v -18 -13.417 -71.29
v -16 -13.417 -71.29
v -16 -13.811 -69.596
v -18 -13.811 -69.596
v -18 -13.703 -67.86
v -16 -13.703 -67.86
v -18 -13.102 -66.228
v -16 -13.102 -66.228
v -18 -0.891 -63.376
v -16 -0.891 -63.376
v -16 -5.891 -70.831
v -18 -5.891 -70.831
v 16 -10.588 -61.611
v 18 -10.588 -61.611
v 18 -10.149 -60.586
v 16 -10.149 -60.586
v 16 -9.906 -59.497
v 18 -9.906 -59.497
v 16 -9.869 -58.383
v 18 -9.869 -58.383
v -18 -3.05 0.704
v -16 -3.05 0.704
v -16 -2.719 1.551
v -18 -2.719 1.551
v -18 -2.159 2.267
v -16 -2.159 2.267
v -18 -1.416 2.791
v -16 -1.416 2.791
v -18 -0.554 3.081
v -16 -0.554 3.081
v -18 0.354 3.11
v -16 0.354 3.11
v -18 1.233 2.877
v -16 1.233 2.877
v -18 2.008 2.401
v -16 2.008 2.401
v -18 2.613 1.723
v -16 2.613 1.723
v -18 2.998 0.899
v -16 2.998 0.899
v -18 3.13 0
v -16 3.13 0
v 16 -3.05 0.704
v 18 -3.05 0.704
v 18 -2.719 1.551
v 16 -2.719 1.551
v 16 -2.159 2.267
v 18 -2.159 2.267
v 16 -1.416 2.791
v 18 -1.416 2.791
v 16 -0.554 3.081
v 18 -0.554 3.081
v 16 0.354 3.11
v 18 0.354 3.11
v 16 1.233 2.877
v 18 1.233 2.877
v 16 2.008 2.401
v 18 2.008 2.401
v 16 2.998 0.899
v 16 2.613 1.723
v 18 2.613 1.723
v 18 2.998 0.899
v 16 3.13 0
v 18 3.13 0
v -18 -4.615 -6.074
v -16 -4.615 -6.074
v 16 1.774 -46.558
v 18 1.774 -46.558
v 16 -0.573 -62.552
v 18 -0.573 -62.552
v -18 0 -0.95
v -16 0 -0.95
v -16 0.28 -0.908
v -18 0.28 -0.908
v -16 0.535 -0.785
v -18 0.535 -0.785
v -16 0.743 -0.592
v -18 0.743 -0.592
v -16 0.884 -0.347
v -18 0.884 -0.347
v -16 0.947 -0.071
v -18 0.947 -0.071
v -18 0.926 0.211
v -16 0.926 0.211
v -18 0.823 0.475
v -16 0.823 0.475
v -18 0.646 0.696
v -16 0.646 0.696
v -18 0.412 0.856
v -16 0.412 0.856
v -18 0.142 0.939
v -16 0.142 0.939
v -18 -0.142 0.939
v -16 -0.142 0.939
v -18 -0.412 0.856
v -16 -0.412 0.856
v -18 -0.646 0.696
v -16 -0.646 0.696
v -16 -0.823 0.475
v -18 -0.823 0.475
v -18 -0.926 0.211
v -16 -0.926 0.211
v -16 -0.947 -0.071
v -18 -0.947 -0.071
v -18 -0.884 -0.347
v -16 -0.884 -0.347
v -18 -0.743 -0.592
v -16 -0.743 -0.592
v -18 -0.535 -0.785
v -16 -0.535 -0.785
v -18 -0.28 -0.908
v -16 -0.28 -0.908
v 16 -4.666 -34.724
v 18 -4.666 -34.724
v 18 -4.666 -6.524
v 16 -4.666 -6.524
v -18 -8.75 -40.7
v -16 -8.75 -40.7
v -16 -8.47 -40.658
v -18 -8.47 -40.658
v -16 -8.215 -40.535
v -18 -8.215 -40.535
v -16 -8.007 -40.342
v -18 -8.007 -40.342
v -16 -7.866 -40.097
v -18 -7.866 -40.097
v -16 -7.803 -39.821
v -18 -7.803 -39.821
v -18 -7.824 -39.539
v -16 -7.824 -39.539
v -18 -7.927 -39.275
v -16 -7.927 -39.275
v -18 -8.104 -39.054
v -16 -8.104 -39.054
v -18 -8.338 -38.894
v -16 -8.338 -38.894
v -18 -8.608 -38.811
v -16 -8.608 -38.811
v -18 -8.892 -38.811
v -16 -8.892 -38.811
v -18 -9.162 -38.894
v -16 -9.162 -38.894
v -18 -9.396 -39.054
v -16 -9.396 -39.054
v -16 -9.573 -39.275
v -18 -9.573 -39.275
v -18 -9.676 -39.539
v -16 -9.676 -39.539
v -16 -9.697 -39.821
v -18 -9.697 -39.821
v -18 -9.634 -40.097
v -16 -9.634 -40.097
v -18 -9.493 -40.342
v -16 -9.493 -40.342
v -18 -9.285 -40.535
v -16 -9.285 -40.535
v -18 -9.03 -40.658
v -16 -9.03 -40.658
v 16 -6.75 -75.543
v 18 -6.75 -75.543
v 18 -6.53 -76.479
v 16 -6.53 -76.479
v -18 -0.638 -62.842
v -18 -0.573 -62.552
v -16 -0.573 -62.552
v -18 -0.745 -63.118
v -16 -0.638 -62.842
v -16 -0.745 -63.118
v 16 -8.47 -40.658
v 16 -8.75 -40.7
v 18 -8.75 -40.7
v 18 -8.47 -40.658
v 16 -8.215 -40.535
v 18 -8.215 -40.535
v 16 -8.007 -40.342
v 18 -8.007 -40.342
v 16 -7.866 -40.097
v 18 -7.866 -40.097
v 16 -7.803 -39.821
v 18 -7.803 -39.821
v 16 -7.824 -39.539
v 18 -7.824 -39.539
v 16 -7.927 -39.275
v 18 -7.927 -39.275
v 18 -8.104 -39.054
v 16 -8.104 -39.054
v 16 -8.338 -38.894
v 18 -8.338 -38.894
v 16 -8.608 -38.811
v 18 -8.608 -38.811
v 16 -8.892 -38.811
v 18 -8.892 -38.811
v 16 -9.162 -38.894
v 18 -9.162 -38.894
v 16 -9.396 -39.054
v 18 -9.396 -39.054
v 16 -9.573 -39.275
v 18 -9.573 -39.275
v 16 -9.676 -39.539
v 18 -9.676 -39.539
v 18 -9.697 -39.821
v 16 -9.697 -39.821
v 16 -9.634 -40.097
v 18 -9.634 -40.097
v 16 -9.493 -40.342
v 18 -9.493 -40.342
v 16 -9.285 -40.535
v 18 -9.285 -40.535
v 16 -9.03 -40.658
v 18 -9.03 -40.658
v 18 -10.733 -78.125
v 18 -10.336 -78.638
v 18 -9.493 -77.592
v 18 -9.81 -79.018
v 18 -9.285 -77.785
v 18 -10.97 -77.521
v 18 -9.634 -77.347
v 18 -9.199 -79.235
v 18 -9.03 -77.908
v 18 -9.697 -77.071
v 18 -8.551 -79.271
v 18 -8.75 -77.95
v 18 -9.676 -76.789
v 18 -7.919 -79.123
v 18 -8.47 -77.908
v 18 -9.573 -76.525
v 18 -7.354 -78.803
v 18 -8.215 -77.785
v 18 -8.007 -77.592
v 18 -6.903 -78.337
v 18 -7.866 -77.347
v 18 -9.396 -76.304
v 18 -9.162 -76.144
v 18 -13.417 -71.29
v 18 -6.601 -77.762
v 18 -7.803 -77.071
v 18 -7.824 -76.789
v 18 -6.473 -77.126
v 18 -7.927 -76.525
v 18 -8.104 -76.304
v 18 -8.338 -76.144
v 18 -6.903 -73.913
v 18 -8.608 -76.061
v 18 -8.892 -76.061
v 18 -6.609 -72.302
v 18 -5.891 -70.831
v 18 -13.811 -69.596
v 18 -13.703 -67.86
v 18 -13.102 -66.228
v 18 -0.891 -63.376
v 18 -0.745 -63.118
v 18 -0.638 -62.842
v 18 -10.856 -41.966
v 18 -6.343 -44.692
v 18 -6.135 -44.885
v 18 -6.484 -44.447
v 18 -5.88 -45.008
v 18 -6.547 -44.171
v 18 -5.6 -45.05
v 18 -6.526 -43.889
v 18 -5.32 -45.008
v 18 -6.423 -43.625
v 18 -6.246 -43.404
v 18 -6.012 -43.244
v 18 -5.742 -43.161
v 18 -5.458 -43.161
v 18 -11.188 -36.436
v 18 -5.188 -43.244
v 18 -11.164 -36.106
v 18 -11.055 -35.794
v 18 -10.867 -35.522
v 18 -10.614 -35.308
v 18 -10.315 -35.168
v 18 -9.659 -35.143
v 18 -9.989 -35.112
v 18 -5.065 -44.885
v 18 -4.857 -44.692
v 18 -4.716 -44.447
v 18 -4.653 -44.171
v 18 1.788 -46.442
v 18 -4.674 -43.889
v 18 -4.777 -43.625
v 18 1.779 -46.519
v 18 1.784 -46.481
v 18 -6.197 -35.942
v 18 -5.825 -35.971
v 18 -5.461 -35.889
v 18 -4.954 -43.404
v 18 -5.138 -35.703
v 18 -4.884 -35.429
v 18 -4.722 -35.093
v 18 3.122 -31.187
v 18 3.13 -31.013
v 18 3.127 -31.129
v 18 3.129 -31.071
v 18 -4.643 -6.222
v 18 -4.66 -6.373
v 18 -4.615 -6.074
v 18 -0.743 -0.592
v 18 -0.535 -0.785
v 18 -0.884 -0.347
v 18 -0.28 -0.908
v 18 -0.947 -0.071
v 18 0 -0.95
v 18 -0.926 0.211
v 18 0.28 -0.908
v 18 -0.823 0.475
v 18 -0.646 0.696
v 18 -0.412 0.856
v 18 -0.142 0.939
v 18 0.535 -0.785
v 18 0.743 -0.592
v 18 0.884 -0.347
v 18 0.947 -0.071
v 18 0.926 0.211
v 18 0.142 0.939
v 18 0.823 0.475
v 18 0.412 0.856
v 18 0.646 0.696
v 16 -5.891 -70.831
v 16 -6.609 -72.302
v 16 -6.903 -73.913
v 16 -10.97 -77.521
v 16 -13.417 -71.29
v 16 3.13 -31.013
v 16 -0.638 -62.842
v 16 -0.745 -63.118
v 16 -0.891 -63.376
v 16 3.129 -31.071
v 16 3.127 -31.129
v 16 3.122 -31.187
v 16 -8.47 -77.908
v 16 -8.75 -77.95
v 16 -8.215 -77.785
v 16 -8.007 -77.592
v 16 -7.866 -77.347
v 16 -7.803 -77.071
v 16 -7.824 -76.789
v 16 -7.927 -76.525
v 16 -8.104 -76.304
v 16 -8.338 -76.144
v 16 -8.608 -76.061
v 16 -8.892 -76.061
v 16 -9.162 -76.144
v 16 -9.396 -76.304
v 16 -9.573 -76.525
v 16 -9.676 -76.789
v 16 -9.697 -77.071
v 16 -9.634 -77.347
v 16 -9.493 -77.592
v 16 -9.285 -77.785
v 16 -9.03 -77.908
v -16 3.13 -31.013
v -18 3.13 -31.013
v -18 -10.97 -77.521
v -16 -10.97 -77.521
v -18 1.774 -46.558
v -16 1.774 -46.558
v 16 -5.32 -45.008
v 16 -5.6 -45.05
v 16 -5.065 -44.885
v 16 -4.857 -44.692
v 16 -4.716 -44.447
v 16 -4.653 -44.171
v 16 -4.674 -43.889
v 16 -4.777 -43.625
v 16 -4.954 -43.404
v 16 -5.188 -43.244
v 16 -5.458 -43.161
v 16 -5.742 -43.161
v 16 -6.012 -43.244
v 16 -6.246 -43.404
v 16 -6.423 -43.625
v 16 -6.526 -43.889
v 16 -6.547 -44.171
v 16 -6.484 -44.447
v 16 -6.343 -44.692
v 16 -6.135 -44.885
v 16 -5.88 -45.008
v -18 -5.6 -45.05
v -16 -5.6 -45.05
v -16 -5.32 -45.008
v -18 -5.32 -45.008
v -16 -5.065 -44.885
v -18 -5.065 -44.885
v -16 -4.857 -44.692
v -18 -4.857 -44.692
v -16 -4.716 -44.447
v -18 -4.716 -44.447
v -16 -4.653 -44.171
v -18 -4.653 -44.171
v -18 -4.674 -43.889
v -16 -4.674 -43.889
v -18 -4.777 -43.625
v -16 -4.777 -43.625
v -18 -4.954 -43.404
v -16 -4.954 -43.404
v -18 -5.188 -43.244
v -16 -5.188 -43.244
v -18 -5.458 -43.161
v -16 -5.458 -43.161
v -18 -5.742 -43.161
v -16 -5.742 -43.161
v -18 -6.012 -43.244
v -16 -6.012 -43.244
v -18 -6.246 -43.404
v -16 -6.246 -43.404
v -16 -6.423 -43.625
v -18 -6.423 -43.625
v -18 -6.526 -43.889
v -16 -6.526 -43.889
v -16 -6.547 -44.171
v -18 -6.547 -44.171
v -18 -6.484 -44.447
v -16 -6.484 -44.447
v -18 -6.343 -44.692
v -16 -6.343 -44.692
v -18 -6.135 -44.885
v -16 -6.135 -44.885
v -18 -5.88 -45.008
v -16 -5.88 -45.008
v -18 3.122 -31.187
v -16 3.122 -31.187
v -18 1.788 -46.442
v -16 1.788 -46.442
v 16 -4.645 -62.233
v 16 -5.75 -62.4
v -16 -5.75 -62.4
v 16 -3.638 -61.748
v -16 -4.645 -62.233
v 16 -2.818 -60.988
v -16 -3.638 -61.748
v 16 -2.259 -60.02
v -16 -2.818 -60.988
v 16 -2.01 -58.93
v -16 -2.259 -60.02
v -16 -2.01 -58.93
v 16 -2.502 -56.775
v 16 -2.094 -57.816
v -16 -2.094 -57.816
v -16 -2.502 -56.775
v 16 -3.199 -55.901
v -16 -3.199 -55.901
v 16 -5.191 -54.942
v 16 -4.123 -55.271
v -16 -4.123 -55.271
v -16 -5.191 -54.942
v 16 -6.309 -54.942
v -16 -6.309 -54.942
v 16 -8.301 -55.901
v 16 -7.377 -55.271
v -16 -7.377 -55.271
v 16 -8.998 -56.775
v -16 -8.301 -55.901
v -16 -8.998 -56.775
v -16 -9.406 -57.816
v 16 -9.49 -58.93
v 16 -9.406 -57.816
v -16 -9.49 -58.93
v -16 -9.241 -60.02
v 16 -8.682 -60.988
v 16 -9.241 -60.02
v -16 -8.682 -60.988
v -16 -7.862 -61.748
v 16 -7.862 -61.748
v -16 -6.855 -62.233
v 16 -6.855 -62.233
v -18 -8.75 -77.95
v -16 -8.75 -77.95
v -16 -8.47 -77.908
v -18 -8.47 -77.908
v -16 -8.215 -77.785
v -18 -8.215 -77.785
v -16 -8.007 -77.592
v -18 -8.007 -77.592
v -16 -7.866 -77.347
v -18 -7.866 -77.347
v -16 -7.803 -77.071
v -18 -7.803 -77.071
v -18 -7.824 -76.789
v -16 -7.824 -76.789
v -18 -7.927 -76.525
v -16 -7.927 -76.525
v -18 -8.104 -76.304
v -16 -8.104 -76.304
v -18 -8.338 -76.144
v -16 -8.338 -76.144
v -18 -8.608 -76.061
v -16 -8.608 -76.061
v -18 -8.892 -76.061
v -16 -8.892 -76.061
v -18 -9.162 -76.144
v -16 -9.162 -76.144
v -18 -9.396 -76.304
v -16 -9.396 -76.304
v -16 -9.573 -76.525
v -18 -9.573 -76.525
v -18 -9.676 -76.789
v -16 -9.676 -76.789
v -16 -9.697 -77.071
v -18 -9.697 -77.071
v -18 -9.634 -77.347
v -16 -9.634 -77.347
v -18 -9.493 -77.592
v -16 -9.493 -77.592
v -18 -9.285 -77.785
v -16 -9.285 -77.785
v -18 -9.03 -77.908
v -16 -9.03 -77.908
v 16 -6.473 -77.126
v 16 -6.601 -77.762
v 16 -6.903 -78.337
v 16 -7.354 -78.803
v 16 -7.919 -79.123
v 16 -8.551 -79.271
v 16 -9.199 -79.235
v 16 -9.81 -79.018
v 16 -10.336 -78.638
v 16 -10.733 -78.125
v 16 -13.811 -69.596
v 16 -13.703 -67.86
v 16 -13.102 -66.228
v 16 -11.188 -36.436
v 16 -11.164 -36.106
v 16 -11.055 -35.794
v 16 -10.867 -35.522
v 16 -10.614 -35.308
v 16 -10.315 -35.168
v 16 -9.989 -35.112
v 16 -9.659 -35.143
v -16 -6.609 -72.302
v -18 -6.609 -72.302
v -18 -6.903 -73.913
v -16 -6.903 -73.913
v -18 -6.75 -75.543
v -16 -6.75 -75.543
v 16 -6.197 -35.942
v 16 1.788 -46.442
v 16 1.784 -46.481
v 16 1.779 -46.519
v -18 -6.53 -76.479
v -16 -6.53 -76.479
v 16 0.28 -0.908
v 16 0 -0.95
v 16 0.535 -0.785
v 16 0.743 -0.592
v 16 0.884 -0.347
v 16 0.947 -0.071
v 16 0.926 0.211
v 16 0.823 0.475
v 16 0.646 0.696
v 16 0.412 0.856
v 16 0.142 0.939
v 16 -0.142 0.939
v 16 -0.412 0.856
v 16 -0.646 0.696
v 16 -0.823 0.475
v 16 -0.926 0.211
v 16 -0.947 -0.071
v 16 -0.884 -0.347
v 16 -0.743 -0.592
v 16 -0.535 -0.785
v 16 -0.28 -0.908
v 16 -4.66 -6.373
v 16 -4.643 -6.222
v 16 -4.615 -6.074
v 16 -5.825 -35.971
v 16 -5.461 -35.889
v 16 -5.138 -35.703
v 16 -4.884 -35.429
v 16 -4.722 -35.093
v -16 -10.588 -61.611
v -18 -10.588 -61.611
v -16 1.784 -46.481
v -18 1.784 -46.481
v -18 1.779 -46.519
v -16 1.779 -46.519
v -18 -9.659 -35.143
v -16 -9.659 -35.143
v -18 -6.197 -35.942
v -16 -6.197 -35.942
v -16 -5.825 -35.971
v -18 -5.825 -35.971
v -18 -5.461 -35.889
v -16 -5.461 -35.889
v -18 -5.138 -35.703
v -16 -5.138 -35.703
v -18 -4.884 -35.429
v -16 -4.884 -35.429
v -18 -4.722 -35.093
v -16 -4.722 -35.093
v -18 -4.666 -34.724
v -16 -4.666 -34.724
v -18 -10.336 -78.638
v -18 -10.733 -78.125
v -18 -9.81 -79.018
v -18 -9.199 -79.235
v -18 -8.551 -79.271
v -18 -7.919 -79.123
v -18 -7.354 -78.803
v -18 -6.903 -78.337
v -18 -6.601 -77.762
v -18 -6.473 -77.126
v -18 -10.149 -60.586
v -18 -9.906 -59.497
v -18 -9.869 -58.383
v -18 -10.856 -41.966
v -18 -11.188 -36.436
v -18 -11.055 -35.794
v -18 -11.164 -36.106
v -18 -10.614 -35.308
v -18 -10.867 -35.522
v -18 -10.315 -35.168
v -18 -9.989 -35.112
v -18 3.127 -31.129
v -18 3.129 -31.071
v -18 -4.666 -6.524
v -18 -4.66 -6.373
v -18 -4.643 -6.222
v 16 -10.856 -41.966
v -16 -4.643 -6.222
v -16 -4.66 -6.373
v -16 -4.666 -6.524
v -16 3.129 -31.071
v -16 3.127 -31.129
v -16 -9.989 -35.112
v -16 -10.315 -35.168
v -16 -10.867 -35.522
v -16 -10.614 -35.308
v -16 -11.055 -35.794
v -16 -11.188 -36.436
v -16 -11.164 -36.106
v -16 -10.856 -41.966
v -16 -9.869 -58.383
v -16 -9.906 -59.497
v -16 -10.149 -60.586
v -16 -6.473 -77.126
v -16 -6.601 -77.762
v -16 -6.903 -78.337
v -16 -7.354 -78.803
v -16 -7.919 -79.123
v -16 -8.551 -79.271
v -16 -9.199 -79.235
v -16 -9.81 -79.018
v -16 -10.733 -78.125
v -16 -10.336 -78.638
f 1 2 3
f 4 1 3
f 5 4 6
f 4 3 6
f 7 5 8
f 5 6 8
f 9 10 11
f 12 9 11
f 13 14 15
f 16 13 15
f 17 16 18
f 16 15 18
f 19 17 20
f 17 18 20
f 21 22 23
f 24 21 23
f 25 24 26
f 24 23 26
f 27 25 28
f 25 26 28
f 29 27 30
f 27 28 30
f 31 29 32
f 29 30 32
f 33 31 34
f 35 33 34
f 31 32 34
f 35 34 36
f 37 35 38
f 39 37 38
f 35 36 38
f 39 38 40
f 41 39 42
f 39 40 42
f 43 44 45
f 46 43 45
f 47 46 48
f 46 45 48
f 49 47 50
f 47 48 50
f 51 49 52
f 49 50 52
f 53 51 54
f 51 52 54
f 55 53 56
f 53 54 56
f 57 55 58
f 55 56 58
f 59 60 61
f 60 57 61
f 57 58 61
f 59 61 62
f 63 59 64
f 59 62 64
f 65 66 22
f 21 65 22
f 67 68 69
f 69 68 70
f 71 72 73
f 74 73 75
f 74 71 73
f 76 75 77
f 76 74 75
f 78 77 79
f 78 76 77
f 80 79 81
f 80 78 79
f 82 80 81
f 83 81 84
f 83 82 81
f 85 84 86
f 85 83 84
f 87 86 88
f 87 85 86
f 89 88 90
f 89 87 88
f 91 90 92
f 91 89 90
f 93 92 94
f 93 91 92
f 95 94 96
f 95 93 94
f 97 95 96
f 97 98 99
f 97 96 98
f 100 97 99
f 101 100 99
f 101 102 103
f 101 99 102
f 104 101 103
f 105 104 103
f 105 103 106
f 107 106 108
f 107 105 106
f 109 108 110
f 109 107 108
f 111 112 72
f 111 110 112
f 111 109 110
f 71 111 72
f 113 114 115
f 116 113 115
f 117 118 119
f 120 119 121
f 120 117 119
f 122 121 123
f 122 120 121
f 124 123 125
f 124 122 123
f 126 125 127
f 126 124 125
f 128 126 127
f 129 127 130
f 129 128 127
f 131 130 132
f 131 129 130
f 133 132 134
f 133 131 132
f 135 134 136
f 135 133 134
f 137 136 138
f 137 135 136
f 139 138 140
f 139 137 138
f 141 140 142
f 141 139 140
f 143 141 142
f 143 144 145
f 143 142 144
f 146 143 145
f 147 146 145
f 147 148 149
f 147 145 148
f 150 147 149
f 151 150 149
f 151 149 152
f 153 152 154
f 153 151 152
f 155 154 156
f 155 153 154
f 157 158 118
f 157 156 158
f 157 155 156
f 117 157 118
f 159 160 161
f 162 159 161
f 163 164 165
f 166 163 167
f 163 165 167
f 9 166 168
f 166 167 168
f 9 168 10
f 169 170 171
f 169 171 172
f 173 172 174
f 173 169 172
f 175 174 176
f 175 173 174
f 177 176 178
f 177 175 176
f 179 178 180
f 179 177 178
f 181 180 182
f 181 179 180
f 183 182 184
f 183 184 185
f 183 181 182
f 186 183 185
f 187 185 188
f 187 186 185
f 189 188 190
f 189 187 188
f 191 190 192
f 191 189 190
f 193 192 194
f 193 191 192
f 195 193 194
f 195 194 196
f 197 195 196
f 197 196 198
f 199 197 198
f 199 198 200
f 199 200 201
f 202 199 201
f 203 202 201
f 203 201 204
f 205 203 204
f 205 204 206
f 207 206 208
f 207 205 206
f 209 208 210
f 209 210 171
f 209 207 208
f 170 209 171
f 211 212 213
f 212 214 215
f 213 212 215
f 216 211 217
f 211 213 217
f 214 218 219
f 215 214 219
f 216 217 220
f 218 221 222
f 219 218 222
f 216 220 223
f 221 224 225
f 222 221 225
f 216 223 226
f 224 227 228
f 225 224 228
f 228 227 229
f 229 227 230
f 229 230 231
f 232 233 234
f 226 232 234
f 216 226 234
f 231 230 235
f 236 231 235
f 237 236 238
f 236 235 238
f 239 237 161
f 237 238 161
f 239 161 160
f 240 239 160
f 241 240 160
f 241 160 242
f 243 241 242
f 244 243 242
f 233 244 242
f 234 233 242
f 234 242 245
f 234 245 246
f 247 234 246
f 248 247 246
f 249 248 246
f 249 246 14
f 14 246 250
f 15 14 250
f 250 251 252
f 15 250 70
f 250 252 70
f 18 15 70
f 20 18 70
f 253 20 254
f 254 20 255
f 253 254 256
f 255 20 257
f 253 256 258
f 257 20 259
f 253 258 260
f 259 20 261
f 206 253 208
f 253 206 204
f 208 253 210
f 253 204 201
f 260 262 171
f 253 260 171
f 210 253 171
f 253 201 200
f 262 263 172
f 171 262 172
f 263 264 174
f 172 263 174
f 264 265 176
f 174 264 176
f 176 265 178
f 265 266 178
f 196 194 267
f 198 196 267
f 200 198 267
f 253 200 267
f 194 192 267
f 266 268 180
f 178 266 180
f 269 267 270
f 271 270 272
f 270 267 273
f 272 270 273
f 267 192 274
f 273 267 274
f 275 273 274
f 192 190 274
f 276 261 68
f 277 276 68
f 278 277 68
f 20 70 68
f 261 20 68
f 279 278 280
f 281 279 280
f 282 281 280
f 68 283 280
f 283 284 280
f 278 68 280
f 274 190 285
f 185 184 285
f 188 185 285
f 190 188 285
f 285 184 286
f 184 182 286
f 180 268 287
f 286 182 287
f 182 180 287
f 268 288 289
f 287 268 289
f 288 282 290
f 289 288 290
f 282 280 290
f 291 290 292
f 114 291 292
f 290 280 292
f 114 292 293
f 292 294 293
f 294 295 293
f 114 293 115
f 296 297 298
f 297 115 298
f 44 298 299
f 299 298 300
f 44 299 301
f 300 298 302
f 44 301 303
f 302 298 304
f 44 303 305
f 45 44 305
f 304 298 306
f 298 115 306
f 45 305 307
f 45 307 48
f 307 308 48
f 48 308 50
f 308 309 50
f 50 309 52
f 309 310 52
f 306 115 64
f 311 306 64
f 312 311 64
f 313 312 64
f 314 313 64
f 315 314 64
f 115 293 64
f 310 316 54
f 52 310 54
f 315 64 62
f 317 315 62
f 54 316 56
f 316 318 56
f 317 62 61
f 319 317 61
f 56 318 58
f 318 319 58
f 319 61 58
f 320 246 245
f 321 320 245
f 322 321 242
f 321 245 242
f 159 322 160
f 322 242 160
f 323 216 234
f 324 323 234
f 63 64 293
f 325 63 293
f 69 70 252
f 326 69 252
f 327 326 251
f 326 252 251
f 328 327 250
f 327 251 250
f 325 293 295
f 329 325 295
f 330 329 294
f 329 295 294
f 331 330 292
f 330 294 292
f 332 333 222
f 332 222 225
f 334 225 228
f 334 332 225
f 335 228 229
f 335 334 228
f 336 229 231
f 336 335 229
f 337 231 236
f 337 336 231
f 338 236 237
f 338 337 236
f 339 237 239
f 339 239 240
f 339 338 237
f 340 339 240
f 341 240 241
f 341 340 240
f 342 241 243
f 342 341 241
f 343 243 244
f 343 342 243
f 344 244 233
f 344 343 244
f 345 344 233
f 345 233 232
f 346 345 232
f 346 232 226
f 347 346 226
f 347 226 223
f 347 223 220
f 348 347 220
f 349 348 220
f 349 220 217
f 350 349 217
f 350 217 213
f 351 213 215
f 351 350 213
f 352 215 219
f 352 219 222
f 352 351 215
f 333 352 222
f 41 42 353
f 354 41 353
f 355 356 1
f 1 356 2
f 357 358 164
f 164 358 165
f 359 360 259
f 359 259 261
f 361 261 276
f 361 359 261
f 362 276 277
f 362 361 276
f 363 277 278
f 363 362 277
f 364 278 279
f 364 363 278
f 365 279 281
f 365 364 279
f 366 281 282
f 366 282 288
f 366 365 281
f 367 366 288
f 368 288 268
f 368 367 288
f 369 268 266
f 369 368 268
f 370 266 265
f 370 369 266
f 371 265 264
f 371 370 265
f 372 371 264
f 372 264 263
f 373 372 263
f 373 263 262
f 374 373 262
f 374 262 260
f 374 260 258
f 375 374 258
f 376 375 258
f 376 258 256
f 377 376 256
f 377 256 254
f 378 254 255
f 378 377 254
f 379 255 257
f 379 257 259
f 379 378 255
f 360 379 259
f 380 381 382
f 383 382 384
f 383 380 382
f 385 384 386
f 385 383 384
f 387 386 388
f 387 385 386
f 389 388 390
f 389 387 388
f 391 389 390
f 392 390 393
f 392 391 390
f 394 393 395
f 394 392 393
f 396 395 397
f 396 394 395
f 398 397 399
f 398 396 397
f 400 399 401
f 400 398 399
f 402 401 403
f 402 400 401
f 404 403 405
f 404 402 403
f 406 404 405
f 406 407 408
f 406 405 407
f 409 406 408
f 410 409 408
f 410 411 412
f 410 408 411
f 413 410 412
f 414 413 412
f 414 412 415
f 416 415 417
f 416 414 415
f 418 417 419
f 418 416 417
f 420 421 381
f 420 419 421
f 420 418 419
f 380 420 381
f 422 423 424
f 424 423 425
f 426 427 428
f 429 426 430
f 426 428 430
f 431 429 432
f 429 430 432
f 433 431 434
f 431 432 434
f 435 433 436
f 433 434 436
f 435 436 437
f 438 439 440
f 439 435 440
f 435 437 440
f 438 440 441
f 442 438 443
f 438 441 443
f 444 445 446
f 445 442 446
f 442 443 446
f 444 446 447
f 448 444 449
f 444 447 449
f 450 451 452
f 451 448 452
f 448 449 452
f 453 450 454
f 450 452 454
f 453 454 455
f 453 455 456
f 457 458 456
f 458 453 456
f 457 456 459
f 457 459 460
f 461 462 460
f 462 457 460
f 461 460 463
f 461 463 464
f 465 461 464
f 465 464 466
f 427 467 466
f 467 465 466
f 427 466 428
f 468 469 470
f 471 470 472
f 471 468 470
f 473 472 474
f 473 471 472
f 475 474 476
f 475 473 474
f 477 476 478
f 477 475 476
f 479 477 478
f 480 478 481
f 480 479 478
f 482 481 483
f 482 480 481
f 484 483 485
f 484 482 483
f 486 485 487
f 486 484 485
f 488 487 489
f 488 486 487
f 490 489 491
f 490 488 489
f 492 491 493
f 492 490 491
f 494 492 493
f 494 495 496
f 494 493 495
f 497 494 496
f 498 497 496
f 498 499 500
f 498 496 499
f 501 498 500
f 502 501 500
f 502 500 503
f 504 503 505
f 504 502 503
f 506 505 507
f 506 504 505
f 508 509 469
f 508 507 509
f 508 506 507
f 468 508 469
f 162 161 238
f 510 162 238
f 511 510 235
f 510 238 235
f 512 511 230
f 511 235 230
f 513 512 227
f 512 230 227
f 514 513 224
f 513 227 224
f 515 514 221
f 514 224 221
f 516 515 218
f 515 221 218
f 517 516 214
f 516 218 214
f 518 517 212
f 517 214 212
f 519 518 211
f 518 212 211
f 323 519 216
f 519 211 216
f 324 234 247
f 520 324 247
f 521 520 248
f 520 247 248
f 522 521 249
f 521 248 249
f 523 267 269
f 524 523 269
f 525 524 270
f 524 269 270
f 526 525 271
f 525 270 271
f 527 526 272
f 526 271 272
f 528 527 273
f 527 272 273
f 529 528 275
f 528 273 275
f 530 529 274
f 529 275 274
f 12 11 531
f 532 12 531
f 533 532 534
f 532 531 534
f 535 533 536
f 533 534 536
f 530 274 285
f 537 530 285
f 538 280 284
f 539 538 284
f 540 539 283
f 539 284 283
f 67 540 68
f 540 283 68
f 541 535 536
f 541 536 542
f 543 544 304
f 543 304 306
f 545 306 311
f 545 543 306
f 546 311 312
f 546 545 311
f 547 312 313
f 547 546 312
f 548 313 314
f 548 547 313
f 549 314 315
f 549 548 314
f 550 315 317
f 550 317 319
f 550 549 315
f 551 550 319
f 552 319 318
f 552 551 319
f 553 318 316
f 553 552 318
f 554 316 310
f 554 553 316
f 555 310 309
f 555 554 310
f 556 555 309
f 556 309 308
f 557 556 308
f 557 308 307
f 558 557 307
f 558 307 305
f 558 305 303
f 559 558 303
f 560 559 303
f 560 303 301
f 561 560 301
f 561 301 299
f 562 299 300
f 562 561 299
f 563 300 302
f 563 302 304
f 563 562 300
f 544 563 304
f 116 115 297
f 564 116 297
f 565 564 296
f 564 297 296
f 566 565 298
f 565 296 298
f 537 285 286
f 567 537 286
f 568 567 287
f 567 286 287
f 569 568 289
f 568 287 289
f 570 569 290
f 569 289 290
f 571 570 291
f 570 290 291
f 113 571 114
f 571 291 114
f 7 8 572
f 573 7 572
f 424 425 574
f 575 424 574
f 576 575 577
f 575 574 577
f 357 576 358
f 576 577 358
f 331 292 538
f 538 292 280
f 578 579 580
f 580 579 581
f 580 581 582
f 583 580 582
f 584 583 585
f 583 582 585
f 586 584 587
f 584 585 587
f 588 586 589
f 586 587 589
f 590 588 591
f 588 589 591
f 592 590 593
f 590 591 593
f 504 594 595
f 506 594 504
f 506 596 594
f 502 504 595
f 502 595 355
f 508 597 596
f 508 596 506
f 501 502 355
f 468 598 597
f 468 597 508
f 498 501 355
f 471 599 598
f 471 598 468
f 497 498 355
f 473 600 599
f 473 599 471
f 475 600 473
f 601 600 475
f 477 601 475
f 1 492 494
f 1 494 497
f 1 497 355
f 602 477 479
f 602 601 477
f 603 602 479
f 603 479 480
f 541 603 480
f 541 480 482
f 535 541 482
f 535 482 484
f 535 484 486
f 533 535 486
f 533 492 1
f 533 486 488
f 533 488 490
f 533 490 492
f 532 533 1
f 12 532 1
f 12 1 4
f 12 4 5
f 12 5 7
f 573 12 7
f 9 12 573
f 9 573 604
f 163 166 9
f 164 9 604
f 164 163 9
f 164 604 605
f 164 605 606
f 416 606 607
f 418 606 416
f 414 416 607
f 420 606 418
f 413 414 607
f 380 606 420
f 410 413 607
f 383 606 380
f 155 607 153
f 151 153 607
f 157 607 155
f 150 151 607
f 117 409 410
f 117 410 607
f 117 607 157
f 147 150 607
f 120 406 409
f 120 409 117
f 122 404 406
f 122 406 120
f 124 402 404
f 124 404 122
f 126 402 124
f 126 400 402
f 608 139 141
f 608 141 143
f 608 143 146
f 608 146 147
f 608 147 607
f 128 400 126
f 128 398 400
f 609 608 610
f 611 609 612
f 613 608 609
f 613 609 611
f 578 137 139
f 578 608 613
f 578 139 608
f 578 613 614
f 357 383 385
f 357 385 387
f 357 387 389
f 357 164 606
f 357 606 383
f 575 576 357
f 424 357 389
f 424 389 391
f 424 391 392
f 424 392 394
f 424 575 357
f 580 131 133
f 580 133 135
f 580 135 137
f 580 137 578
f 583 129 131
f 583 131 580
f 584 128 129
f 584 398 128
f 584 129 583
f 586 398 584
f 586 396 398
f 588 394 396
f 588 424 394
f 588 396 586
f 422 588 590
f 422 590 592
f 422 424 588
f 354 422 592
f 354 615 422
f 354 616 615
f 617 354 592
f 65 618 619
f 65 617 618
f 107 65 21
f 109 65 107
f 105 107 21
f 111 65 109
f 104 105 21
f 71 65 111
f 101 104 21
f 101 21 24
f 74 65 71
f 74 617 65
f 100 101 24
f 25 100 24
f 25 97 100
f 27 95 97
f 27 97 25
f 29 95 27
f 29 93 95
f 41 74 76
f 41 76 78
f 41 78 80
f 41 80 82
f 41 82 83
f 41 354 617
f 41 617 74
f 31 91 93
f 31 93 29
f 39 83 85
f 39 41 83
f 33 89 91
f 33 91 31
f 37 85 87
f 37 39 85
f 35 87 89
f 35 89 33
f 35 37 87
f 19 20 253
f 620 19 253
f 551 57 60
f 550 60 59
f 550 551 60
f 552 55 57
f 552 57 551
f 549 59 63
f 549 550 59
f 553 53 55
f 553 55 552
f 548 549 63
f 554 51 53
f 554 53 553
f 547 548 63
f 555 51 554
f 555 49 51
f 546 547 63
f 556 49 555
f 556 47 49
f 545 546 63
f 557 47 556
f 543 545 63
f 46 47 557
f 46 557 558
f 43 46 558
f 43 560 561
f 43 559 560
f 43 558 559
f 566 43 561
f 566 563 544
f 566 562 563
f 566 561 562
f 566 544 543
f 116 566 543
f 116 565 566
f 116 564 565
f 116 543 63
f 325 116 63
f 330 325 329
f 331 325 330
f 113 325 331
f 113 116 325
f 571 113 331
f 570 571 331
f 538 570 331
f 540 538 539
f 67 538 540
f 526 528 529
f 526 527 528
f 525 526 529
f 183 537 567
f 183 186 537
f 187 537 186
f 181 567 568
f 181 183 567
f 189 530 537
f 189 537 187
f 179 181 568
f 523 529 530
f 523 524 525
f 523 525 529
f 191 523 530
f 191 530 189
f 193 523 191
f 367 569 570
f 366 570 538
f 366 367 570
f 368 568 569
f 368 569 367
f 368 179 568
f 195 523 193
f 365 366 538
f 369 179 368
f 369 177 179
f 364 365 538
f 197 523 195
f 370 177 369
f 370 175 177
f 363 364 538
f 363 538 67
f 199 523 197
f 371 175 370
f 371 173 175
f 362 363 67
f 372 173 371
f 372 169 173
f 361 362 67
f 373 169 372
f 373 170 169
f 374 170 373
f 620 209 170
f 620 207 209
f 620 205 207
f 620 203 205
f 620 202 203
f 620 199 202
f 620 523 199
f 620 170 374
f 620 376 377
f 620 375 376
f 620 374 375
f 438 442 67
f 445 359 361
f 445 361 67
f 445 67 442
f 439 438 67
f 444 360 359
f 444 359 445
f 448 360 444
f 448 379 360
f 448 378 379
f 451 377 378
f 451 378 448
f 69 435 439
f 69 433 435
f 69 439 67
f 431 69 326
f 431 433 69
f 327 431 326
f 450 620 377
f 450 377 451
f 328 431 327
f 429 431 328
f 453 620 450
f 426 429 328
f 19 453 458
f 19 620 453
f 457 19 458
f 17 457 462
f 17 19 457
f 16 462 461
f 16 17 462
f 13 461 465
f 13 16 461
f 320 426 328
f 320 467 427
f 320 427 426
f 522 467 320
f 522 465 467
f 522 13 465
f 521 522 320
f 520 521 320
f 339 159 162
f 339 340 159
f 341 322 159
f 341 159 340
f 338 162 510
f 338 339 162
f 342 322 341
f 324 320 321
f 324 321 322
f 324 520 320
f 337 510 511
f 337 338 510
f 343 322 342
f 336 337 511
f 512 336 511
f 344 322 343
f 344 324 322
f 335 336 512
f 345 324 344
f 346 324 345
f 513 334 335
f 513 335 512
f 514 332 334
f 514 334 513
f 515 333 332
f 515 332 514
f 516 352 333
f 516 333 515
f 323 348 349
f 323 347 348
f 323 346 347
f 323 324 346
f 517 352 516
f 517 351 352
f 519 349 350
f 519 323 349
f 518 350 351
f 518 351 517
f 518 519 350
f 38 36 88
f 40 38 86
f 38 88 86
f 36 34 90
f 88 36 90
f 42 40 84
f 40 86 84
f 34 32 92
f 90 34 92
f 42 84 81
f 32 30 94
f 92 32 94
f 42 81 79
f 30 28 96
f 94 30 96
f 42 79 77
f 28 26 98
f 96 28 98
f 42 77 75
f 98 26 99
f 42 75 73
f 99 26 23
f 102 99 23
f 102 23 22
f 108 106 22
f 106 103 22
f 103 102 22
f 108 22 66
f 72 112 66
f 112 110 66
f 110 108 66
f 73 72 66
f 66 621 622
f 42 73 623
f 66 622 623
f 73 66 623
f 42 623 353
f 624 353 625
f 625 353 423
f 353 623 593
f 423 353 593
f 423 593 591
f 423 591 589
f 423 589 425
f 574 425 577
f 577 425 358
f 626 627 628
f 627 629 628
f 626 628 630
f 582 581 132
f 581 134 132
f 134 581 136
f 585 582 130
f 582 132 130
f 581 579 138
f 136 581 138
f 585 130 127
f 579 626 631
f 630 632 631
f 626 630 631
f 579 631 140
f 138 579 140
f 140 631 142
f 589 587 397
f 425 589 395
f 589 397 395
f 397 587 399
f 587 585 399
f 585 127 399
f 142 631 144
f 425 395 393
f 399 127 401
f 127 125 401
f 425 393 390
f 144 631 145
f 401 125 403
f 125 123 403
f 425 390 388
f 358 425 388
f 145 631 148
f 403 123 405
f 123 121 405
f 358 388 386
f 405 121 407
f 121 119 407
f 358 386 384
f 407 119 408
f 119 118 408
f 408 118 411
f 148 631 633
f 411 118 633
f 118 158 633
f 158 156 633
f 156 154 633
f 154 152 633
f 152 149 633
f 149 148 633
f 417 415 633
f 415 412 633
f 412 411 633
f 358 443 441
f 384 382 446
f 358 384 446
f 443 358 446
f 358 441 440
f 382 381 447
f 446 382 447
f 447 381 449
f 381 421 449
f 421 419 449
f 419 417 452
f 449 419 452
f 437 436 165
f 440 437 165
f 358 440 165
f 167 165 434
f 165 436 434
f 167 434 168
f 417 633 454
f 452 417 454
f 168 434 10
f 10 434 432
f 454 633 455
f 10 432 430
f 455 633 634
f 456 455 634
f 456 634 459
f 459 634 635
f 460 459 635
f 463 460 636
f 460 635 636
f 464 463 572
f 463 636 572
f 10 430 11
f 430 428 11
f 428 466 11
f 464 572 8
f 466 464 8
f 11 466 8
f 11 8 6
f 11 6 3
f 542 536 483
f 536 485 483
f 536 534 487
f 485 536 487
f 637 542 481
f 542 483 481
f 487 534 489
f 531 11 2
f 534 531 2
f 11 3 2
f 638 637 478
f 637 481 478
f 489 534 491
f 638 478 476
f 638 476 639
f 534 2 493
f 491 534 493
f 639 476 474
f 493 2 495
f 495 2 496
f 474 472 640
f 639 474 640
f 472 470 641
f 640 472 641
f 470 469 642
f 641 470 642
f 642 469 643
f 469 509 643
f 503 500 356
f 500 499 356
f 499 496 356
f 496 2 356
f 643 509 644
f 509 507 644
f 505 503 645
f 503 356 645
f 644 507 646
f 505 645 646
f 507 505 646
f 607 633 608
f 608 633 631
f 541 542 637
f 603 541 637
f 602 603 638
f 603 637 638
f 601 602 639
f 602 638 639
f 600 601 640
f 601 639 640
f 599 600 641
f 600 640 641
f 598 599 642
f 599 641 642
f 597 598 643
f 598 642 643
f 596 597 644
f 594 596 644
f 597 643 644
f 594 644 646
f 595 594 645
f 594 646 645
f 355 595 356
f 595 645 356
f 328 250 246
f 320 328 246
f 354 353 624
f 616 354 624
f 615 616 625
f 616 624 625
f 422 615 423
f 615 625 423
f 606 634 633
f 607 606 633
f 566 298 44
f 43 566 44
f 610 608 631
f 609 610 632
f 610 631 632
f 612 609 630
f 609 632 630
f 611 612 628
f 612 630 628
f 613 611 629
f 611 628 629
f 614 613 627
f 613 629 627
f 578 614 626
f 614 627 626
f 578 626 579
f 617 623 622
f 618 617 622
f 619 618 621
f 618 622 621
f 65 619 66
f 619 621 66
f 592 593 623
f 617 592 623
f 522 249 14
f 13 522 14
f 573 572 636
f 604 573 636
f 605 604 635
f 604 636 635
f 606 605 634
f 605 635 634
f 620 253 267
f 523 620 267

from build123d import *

# Parameters (mm, degrees)
SKETCH1_R                = 0.95
BOSS_EXTRUDE1_DEPTH      = 18
FILLET1_R                = 2
CUT_EXTRUDE1_DEPTH       = 83.46596287
CUT_EXTRUDE1_DEPTH_BACK  = 83.46596287
SKETCH2_W                = 32
SKETCH2_H                = 82.41
BOSS_EXTRUDE2_DEPTH      = 18
BOSS_EXTRUDE2_DEPTH_BACK = 16
SKETCH3_R                = 3.75


with BuildPart() as part:
    # Sketch1 → Boss-Extrude1 (new, symmetric)
    with BuildSketch(Plane(origin=(0, 0, 0), x_dir=(0, 0, -1), z_dir=(1, 0, 0))):
        with BuildLine():
            Line((0, 3.13), (31.1, 3.13))
            Line((31.1, 3.13), (46.5, 1.782674582))
            Line((46.5, 1.782674582), (63, -0.639122384))
            Line((63, -0.639122384), (70.830854785, -5.891324783))
            ThreePointArc((70.830854785, -5.891324783), (73.097482442, -6.811154728), (75.542872081, -6.749855612))
            Line((75.542872081, -6.749855612), (76.479440337, -6.530221264))
            ThreePointArc((76.479440337, -6.530221264), (79.219778736, -8.229440337), (77.520559663, -10.969778736))
            Line((77.520559663, -10.969778736), (71.28999194, -13.416530703))
            ThreePointArc((71.28999194, -13.416530703), (68.724269269, -13.820147489), (66.228359009, -13.10162727))
            Line((66.228359009, -13.10162727), (61.611119998, -10.588406897))
            ThreePointArc((61.611119998, -10.588406897), (60.047418456, -10.001895705), (58.382627665, -9.86911952))
            Line((58.382627665, -9.86911952), (41.966210219, -10.855936181))
            Line((41.966210219, -10.855936181), (36.436012725, -11.188365046))
            ThreePointArc((36.436012725, -11.188365046), (35.406545304, -10.747772649), (35.143046066, -9.659428502))
            Line((35.143046066, -9.659428502), (35.942400407, -6.197044459))
            ThreePointArc((35.942400407, -6.197044459), (35.702698022, -5.137712345), (34.724437826, -4.665855641))
            Line((34.724437826, -4.665855641), (6.2959032, -4.665855641))
            Line((6.2959032, -4.665855641), (-0.7040968, -3.049778303))
            ThreePointArc((-0.7040968, -3.049778303), (-3.109879908, 0.354326059), (0, 3.13))
        make_face()
        Circle(SKETCH1_R, mode=Mode.SUBTRACT)
        with Locations((77, -8.75)):
            Circle(SKETCH1_R, mode=Mode.SUBTRACT)
        with Locations((44.1, -5.6)):
            Circle(SKETCH1_R, mode=Mode.SUBTRACT)
        with Locations((39.75, -8.75)):
            Circle(SKETCH1_R, mode=Mode.SUBTRACT)
    extrude(amount=BOSS_EXTRUDE1_DEPTH, both=True)

    # Fillet1
    # the kernel refuses this fillet: 2 mm, written as the material it takes off along each edge
    with BuildSketch(Plane(origin=(18.218304715, 3.13, -31.1), x_dir=(0, -0.08715574274766148, -0.9961946980917452), z_dir=(-1, 0, 0))) as fillet1_piece_1:
        with BuildLine():
            CenterArc((FILLET1_R * 0.0436609429085, FILLET1_R), FILLET1_R, 265, 5)
            Line((-FILLET1_R * 0.0434947998391, FILLET1_R * 0.00380530190825), (0, 0))
            Line((0, 0), (FILLET1_R * 0.0436609429085, 0))
        make_face()
    extrude(amount=36.436609429, mode=Mode.SUBTRACT)
    with BuildSketch(Plane(origin=(18.14621298, 1.782674582, -46.5), x_dir=(0, -0.14521967007723557, -0.9893994377513355), z_dir=(-1, 0, 0))) as fillet1_piece_2:
        with BuildLine():
            CenterArc((FILLET1_R * 0.0292425960983, FILLET1_R), FILLET1_R, 266.65, 3.35)
            Line((-FILLET1_R * 0.02919262642, FILLET1_R * 0.00170879761001), (0, 0))
            Line((0, 0), (FILLET1_R * 0.0292425960983, 0))
        make_face()
    extrude(amount=36.292425961, mode=Mode.SUBTRACT)
    with BuildSketch(Plane(origin=(19.131384491, -0.639122384, -63), x_dir=(0, -0.5570205743376995, -0.8304986934152874), z_dir=(-1, 0, 0))) as fillet1_piece_3:
        with BuildLine():
            CenterArc((FILLET1_R * 0.226276898255, FILLET1_R), FILLET1_R, 244.5, 25.5)
            Line((-FILLET1_R * 0.204234198553, FILLET1_R * 0.0974147156501), (0, 0))
            Line((0, 0), (FILLET1_R * 0.226276898255, 0))
        make_face()
    extrude(amount=38.262768983, mode=Mode.SUBTRACT)
    with BuildSketch(Plane(origin=(18.569678042, -4.665855641, -6.2959032), x_dir=(0, 0.22495105434386356, 0.9743700647852356), z_dir=(-1, 0, 0))) as fillet1_piece_4:
        with BuildLine():
            CenterArc((FILLET1_R * 0.113935608302, FILLET1_R), FILLET1_R, 257, 13)
            Line((-FILLET1_R * 0.111015446042, FILLET1_R * 0.0256299352148), (0, 0))
            Line((0, 0), (FILLET1_R * 0.113935608302, 0))
        make_face()
    extrude(amount=37.139356083, mode=Mode.SUBTRACT)

    # Sketch2 → Cut-Extrude1 (cut, two sides: drawn at the far end of the back side and taken through both)
    with BuildSketch(Plane(origin=(0, 0, 0), x_dir=(1, 0, 0), z_dir=(0, 1, 0)).offset(-CUT_EXTRUDE1_DEPTH_BACK)):
        with Locations((0, 38.075)):
            Rectangle(SKETCH2_W, SKETCH2_H)
    extrude(amount=CUT_EXTRUDE1_DEPTH + CUT_EXTRUDE1_DEPTH_BACK, mode=Mode.SUBTRACT)


with BuildPart() as cut_extrude1_piece_1:
    # of the separate pieces the step leaves, piece 1, a body of its own (cut_extrude1_pieces)
    add(part.part.solids().sort_by_distance((16, -13.416530703, -71.28999194))[0])



with BuildPart() as cut_extrude1_piece_2:
    # of the separate pieces the step leaves, piece 2, a body of its own (cut_extrude1_pieces)
    add(part.part.solids().sort_by_distance((-18, -13.416530703, -71.28999194))[0])


with BuildPart() as cut_extrude1_piece_1_1:
    add(cut_extrude1_piece_1.part)

    add(cut_extrude1_piece_2.part)  # Boss-Extrude2 merges Cut-Extrude1 piece 2
    # Sketch3 → Boss-Extrude2 (add, two sides: drawn at the far end of the back side and taken through both)
    with BuildSketch(Plane(origin=(0, 0, 0), x_dir=(0, 0, -1), z_dir=(1, 0, 0)).offset(-BOSS_EXTRUDE2_DEPTH_BACK)):
        with Locations((58.65, -5.75)):
            Circle(SKETCH3_R)
    extrude(amount=BOSS_EXTRUDE2_DEPTH + BOSS_EXTRUDE2_DEPTH_BACK)


solid = cut_extrude1_piece_1_1.part
